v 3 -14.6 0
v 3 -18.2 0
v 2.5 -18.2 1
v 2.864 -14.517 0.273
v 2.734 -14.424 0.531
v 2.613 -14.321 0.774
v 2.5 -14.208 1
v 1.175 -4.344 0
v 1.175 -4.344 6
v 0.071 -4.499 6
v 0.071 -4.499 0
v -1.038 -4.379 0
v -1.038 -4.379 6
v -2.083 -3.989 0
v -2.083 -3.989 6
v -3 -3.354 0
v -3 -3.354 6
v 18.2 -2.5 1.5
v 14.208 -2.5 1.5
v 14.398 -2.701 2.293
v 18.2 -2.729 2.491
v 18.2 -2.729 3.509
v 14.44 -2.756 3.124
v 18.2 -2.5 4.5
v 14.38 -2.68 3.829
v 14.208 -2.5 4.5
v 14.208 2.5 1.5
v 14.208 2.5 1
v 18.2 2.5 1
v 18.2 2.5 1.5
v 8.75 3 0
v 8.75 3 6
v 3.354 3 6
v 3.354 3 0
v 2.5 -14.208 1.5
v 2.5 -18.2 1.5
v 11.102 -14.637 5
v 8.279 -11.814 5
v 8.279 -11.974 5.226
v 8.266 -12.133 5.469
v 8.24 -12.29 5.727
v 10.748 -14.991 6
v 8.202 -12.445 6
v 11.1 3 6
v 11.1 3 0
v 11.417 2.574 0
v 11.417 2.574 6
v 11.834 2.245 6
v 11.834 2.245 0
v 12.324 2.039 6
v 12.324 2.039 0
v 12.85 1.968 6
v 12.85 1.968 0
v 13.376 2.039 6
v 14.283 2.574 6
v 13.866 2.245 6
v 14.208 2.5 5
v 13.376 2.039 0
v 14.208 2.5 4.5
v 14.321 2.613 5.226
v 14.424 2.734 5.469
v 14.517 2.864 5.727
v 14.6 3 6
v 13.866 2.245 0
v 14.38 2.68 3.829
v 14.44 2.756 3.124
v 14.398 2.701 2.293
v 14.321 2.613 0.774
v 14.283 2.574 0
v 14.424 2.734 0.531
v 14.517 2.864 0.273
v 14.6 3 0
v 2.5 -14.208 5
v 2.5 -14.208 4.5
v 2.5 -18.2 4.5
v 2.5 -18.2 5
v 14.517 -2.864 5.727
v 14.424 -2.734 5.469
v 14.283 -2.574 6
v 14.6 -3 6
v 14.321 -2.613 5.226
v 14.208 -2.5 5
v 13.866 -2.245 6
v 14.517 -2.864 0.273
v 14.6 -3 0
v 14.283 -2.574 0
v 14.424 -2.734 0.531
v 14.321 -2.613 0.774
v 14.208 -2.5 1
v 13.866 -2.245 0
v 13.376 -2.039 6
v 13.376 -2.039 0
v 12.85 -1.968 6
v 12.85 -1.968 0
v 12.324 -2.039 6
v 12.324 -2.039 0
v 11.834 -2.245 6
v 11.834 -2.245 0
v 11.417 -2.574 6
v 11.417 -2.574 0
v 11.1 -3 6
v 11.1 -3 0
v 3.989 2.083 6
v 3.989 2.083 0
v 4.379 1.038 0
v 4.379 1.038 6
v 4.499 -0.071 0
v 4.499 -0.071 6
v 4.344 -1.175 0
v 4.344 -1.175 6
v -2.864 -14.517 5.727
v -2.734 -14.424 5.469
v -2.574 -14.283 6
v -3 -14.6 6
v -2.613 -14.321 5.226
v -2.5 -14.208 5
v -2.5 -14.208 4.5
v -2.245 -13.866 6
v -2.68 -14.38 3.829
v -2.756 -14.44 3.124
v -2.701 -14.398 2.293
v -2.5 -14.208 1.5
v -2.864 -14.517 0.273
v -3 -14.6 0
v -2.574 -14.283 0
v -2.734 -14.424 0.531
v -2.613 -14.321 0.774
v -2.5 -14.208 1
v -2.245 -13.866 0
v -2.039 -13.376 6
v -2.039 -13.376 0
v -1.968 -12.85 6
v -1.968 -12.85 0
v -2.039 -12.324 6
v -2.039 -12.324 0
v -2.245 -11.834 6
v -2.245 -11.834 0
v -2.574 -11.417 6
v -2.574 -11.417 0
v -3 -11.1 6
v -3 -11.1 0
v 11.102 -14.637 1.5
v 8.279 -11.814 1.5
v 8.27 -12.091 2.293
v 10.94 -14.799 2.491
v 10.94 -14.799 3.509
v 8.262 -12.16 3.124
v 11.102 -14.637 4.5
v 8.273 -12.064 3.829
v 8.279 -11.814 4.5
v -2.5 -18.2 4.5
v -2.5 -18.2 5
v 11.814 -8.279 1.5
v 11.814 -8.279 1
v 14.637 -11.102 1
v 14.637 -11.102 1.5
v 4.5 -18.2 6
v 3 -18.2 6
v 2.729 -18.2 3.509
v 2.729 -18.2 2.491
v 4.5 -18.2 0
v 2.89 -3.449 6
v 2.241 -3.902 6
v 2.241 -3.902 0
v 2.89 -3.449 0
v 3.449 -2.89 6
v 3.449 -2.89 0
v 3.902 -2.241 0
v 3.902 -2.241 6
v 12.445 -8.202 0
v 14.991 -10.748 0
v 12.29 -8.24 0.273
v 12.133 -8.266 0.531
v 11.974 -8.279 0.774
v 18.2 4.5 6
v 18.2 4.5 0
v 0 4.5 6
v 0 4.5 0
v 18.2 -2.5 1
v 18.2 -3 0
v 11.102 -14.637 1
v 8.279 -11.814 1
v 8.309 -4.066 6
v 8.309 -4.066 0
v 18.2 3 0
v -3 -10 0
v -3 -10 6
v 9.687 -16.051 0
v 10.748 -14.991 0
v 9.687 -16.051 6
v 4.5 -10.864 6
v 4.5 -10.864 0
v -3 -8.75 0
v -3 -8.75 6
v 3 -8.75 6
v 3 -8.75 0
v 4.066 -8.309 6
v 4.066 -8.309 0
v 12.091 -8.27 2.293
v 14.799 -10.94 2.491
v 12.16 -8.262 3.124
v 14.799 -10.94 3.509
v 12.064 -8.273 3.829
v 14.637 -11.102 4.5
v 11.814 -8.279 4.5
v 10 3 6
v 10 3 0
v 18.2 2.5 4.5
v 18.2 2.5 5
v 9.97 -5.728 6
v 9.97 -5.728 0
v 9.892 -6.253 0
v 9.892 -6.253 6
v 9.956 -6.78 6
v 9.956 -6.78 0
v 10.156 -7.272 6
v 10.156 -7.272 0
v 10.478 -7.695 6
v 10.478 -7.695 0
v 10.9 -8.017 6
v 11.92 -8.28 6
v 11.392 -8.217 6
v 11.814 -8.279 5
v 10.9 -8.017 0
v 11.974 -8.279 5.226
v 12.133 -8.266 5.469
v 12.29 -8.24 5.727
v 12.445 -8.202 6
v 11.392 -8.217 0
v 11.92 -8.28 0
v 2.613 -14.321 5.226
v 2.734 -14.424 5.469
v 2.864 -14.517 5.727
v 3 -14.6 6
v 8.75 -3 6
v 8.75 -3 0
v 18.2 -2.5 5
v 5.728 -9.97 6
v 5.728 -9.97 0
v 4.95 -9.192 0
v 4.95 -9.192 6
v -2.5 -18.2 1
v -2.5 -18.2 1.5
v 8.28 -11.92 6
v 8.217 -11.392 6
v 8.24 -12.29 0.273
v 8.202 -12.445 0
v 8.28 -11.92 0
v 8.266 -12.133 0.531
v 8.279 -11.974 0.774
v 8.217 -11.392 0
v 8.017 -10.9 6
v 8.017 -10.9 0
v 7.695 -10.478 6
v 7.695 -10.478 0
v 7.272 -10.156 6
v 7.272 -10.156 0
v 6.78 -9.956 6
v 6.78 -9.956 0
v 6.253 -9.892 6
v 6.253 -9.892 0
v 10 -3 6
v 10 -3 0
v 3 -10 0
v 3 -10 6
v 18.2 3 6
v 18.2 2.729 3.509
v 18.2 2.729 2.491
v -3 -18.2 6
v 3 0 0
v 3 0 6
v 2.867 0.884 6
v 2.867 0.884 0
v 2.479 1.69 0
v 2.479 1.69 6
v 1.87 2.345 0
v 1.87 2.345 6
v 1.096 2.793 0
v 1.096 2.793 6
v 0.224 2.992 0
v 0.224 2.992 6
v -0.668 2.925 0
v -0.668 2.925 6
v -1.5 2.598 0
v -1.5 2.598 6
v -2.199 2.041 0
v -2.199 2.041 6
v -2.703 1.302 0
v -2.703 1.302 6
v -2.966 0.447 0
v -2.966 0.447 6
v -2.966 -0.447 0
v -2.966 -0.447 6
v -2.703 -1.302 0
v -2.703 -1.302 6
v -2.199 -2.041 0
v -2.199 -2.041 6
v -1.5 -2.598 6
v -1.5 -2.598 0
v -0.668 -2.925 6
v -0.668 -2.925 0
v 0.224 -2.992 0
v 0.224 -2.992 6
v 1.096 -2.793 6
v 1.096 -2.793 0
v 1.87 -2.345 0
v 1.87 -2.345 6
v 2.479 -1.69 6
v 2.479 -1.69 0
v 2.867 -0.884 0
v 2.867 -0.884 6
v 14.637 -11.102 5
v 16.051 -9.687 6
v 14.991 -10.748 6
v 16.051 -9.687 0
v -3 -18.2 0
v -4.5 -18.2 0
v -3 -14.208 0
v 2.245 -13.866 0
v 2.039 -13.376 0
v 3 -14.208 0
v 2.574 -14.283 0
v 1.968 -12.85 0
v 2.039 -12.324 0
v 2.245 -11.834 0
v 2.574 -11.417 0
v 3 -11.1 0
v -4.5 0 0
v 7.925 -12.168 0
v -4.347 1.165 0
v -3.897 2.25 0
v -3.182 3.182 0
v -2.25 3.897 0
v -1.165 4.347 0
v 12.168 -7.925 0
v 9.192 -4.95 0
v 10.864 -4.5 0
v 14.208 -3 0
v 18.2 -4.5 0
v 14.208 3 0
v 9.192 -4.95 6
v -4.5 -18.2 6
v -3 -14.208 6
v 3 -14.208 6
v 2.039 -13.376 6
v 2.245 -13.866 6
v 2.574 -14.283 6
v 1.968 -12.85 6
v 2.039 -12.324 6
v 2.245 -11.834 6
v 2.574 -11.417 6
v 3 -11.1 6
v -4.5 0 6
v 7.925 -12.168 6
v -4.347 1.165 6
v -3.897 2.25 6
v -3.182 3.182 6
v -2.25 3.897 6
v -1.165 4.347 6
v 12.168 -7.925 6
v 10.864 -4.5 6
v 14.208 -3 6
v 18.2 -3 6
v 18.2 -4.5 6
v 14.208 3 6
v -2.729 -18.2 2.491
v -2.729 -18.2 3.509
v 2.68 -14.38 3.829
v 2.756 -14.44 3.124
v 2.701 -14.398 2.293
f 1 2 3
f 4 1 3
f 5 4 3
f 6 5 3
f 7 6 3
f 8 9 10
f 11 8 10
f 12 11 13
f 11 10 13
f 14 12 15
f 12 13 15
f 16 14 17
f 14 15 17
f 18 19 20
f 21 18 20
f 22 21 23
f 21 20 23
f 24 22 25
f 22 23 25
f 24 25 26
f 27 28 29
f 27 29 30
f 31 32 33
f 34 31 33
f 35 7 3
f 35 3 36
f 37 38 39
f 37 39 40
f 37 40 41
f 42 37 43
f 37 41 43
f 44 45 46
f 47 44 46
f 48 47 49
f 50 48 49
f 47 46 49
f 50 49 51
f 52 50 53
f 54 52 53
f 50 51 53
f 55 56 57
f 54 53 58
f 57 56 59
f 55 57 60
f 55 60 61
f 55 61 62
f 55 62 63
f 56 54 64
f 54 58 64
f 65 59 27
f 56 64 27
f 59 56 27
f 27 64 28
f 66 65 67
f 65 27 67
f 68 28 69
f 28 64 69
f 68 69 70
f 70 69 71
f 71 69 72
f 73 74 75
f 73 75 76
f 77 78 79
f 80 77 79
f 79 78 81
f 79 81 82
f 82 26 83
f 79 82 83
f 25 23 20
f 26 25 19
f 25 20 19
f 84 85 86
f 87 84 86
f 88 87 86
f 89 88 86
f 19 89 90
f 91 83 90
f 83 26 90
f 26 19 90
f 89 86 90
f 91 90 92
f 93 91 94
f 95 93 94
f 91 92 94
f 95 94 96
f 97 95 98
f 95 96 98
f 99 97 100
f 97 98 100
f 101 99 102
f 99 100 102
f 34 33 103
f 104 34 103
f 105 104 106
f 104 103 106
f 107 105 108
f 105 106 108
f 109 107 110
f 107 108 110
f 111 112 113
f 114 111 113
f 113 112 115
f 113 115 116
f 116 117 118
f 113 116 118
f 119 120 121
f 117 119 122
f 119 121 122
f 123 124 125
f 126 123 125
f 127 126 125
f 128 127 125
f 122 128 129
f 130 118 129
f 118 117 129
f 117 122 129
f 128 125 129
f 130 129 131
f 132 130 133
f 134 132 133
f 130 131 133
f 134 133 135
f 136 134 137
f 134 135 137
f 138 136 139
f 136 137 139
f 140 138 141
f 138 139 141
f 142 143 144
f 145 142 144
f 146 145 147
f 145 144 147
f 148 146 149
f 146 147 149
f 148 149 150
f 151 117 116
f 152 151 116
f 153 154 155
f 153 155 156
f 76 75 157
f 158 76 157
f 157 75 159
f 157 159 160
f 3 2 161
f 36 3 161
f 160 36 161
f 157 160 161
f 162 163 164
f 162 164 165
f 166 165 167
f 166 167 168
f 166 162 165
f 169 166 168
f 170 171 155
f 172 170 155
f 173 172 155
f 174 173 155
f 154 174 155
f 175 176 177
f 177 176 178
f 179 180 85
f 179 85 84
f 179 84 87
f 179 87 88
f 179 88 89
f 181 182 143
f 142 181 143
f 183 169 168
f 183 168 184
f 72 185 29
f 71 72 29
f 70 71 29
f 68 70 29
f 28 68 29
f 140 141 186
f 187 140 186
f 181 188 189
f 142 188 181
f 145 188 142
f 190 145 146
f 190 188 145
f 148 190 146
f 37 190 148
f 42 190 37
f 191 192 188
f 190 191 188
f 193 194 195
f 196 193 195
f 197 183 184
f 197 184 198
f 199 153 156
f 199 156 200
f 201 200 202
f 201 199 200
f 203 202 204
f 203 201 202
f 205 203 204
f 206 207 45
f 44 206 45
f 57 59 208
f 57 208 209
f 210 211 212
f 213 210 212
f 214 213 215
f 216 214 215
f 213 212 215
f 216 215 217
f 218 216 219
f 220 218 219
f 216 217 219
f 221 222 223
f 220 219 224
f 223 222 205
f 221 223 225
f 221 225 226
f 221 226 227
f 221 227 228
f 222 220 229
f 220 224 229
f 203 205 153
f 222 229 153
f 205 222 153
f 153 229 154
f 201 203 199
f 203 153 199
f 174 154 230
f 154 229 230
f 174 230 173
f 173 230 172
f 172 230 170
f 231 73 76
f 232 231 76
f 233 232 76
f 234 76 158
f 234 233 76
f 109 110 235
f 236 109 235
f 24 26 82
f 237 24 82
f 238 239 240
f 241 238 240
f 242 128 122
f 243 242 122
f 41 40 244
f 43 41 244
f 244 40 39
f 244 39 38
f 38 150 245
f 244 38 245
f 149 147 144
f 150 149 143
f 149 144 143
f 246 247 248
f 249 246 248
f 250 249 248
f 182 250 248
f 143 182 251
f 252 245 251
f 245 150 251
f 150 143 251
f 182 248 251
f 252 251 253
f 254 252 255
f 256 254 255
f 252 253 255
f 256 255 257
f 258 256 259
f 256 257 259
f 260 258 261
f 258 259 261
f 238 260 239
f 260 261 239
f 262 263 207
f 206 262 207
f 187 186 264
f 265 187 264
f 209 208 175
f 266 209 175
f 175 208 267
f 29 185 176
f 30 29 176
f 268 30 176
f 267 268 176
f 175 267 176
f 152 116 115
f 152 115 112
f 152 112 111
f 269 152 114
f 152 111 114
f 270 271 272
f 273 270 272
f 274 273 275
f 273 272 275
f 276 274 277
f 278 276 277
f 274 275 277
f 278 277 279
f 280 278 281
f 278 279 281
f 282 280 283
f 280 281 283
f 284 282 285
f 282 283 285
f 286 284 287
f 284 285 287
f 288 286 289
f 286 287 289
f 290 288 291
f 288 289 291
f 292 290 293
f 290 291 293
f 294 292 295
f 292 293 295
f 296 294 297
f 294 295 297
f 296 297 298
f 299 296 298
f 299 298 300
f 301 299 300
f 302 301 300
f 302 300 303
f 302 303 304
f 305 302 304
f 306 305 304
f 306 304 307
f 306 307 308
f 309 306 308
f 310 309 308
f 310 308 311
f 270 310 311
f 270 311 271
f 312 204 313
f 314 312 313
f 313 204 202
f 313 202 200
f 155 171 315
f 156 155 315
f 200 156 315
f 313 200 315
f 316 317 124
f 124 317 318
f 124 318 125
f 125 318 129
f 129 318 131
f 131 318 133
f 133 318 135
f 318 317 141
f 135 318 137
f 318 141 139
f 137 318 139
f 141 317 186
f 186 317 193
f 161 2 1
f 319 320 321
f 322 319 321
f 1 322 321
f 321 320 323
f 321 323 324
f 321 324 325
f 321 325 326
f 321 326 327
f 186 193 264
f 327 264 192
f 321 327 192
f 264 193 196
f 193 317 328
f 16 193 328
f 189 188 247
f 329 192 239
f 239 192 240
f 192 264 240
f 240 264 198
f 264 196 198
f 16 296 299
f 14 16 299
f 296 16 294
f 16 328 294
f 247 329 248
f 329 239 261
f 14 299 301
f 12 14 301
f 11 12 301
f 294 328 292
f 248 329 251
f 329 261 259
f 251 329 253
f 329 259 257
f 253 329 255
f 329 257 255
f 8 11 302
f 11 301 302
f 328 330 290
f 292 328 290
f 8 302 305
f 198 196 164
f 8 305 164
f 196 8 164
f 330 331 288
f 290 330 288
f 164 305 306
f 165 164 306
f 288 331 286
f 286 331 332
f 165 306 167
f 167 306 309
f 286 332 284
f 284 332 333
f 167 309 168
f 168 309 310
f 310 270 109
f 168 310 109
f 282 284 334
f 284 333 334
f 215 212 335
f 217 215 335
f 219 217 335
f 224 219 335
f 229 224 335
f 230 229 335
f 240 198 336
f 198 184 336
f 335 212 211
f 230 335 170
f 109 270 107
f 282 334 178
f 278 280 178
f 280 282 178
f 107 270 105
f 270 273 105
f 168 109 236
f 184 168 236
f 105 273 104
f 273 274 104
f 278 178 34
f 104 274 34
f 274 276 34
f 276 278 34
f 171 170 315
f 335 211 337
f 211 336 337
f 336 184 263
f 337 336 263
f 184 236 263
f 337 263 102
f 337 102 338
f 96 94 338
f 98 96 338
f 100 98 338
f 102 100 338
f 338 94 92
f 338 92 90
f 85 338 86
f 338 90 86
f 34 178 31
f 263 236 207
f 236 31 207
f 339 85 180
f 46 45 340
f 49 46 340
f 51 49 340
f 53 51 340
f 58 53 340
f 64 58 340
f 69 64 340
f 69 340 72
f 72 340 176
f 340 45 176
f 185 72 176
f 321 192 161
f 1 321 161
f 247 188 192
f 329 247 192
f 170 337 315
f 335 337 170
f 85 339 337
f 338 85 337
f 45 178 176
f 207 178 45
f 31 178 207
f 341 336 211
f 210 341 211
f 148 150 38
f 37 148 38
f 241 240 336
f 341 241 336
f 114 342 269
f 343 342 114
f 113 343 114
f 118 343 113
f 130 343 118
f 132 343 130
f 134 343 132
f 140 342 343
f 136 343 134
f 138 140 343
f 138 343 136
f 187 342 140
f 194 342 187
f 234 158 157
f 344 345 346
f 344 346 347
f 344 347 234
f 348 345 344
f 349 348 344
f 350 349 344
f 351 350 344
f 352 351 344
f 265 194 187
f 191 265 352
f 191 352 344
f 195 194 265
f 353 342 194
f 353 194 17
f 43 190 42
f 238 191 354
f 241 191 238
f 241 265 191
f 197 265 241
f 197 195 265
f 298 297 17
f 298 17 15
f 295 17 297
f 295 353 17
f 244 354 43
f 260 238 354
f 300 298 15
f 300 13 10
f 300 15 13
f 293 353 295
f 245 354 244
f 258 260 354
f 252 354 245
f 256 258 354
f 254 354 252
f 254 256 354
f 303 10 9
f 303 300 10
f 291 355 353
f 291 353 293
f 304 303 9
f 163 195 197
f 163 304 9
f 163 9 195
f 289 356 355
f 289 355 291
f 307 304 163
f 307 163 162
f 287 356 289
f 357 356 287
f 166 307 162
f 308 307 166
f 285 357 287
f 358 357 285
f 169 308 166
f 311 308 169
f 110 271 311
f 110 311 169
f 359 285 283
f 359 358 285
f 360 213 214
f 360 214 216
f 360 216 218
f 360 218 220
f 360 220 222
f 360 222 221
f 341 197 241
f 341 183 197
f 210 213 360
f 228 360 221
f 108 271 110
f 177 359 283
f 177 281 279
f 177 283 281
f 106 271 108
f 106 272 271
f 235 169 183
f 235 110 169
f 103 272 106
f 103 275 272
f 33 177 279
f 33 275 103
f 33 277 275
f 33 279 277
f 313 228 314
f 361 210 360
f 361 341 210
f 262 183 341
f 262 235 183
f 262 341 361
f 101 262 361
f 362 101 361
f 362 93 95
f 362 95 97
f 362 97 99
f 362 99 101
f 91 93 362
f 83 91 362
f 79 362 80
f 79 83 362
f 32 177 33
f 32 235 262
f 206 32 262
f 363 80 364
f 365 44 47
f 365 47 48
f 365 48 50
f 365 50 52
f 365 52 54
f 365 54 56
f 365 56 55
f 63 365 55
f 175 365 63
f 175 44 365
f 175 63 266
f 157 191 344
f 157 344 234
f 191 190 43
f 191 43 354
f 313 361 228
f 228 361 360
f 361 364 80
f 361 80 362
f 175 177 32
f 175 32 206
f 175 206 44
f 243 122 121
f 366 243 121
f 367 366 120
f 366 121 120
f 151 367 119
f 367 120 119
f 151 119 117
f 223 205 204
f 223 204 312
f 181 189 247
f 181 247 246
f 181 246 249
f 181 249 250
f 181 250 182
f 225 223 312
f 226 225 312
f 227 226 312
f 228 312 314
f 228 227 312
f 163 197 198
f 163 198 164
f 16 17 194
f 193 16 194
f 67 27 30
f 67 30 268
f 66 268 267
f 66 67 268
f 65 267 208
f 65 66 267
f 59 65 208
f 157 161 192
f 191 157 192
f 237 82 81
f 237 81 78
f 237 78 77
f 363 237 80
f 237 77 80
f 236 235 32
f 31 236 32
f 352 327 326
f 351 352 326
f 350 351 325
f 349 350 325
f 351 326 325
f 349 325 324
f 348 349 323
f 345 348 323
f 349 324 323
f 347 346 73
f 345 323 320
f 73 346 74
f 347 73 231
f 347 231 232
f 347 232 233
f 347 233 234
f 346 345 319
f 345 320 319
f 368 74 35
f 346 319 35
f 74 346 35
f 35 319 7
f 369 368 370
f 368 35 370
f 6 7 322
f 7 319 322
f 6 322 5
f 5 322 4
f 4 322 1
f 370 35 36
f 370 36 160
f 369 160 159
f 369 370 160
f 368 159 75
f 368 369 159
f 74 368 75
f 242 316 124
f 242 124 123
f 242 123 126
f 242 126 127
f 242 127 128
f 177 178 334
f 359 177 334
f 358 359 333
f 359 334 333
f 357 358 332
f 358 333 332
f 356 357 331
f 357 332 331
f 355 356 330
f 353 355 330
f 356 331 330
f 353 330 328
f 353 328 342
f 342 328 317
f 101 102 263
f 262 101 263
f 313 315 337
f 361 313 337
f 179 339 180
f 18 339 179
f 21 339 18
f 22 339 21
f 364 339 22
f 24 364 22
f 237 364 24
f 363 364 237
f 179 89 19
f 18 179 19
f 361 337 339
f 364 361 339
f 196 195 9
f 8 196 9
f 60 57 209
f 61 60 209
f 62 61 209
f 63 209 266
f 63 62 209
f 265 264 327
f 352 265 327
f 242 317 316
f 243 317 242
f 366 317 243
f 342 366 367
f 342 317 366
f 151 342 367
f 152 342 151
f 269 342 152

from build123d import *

# Parameters (mm, degrees)
EXTRUDE_1_DEPTH          = 6
EXTRUDE_2_REACH          = 25.907
PATTERN_CIRCULAR_1_COUNT = 3
PATTERN_CIRCULAR_1_ANGLE = 90
SKETCH_4_R               = 3
CUT_EXTRUDE_1_DEPTH      = 27.42877236


with BuildPart() as part:
    # 草图1 → 凸台-拉伸1 (new body)
    with BuildSketch(Plane.XY):
        with BuildLine():
            Line((-4.5, 0), (-4.5, -18.2))
            Line((-4.5, -18.2), (-3, -18.2))
            Line((-3, -18.2), (-3, -14.6))
            ThreePointArc((-3, -14.6), (-1.968245837, -12.85), (-3, -11.1))
            Line((-3, -11.1), (-3, -10))
            Line((-3, -10), (3, -10))
            Line((3, -10), (3, -11.1))
            ThreePointArc((3, -11.1), (1.968245837, -12.85), (3, -14.6))
            Line((3, -14.6), (3, -18.2))
            Line((3, -18.2), (4.5, -18.2))
            Line((4.5, -18.2), (4.5, 0))
            ThreePointArc((4.5, 0), (0, 4.5), (-4.5, 0))
        make_face()
    extrude_1 = extrude(amount=EXTRUDE_1_DEPTH)

    # 草图3 → 凸台-拉伸2 (add, up to next)
    with BuildSketch(Plane.XZ.offset(18.2), mode=Mode.PRIVATE) as extrude_2_sk1:
        with BuildLine():
            Line((-3, 6), (-3, 0))
            Line((-3, 0), (-2.5, 1))
            Line((-2.5, 1), (-2.5, 1.5))
            ThreePointArc((-2.5, 1.5), (-2.757359313, 3), (-2.5, 4.5))
            Line((-2.5, 4.5), (-2.5, 5))
            Line((-2.5, 5), (-3, 6))
        make_face()
    extrude_2_tool1 = extrude(extrude_2_sk1.sketch, amount=-EXTRUDE_2_REACH, mode=Mode.PRIVATE) - part.part
    # 草图3 → 凸台-拉伸2 (add, up to next)
    with BuildSketch(Plane.XZ.offset(18.2), mode=Mode.PRIVATE) as extrude_2_sk2:
        with BuildLine():
            Line((3, 0), (2.5, 1))
            Line((2.5, 1), (2.5, 1.5))
            ThreePointArc((2.5, 1.5), (2.757359313, 3), (2.5, 4.5))
            Line((2.5, 4.5), (2.5, 5))
            Line((2.5, 5), (3, 6))
            Line((3, 6), (3, 0))
        make_face()
    extrude_2_tool2 = extrude(extrude_2_sk2.sketch, amount=-EXTRUDE_2_REACH, mode=Mode.PRIVATE) - part.part
    extrude_2_1 = extrude_2_tool1.solids().sort_by_distance((-2.809362, -18.2, 3))[0]
    add(extrude_2_1)
    extrude_2_2 = extrude_2_tool2.solids().sort_by_distance((2.809362, -18.2, 3))[0]
    add(extrude_2_2)
    extrude_2 = extrude_2_1 + extrude_2_2  # 凸台-拉伸2 as one shape, for the pattern or mirror that repeats it

    # 阵列(圆周)1: 凸台-拉伸1, 凸台-拉伸2 ×3 about axis
    pattern_circular_1_axis = Axis((0, 0, 0), (0, 0, 1))
    add([extrude_1.rotate(pattern_circular_1_axis, i * PATTERN_CIRCULAR_1_ANGLE / (PATTERN_CIRCULAR_1_COUNT - 1)) for i in range(1, PATTERN_CIRCULAR_1_COUNT)])
    add([extrude_2.rotate(pattern_circular_1_axis, i * PATTERN_CIRCULAR_1_ANGLE / (PATTERN_CIRCULAR_1_COUNT - 1)) for i in range(1, PATTERN_CIRCULAR_1_COUNT)])

    # 草图4 → 切除-拉伸1 (cut, through all)
    with BuildSketch(Plane.XY.offset(6)):
        Circle(SKETCH_4_R)
        with BuildLine():
            Line((8.75, 3), (3.354101966, 3))
            ThreePointArc((3.354101966, 3), (4.378625055, 1.038095674), (4.343906601, -1.174936357))
            Line((4.343906601, -1.174936357), (8.75, -3))
            Line((8.75, -3), (8.75, 3))
        make_face()
        with BuildLine():
            Line((3, -8.75), (1.174936357, -4.343906601))
            ThreePointArc((1.174936357, -4.343906601), (-1.038095674, -4.378625055), (-3, -3.354101966))
            Line((-3, -3.354101966), (-3, -8.75))
            Line((-3, -8.75), (3, -8.75))
        make_face()
        with BuildLine():
            Line((8.308504679, -4.065863992), (4.065863992, -8.308504679))
            Line((4.065863992, -8.308504679), (2.240800349, -3.90241128))
            ThreePointArc((2.240800349, -3.90241128), (3.181980515, -3.181980515), (3.90241128, -2.240800349))
            Line((3.90241128, -2.240800349), (8.308504679, -4.065863992))
        make_face()
    extrude(amount=-CUT_EXTRUDE_1_DEPTH, mode=Mode.SUBTRACT)


solid = part.part
